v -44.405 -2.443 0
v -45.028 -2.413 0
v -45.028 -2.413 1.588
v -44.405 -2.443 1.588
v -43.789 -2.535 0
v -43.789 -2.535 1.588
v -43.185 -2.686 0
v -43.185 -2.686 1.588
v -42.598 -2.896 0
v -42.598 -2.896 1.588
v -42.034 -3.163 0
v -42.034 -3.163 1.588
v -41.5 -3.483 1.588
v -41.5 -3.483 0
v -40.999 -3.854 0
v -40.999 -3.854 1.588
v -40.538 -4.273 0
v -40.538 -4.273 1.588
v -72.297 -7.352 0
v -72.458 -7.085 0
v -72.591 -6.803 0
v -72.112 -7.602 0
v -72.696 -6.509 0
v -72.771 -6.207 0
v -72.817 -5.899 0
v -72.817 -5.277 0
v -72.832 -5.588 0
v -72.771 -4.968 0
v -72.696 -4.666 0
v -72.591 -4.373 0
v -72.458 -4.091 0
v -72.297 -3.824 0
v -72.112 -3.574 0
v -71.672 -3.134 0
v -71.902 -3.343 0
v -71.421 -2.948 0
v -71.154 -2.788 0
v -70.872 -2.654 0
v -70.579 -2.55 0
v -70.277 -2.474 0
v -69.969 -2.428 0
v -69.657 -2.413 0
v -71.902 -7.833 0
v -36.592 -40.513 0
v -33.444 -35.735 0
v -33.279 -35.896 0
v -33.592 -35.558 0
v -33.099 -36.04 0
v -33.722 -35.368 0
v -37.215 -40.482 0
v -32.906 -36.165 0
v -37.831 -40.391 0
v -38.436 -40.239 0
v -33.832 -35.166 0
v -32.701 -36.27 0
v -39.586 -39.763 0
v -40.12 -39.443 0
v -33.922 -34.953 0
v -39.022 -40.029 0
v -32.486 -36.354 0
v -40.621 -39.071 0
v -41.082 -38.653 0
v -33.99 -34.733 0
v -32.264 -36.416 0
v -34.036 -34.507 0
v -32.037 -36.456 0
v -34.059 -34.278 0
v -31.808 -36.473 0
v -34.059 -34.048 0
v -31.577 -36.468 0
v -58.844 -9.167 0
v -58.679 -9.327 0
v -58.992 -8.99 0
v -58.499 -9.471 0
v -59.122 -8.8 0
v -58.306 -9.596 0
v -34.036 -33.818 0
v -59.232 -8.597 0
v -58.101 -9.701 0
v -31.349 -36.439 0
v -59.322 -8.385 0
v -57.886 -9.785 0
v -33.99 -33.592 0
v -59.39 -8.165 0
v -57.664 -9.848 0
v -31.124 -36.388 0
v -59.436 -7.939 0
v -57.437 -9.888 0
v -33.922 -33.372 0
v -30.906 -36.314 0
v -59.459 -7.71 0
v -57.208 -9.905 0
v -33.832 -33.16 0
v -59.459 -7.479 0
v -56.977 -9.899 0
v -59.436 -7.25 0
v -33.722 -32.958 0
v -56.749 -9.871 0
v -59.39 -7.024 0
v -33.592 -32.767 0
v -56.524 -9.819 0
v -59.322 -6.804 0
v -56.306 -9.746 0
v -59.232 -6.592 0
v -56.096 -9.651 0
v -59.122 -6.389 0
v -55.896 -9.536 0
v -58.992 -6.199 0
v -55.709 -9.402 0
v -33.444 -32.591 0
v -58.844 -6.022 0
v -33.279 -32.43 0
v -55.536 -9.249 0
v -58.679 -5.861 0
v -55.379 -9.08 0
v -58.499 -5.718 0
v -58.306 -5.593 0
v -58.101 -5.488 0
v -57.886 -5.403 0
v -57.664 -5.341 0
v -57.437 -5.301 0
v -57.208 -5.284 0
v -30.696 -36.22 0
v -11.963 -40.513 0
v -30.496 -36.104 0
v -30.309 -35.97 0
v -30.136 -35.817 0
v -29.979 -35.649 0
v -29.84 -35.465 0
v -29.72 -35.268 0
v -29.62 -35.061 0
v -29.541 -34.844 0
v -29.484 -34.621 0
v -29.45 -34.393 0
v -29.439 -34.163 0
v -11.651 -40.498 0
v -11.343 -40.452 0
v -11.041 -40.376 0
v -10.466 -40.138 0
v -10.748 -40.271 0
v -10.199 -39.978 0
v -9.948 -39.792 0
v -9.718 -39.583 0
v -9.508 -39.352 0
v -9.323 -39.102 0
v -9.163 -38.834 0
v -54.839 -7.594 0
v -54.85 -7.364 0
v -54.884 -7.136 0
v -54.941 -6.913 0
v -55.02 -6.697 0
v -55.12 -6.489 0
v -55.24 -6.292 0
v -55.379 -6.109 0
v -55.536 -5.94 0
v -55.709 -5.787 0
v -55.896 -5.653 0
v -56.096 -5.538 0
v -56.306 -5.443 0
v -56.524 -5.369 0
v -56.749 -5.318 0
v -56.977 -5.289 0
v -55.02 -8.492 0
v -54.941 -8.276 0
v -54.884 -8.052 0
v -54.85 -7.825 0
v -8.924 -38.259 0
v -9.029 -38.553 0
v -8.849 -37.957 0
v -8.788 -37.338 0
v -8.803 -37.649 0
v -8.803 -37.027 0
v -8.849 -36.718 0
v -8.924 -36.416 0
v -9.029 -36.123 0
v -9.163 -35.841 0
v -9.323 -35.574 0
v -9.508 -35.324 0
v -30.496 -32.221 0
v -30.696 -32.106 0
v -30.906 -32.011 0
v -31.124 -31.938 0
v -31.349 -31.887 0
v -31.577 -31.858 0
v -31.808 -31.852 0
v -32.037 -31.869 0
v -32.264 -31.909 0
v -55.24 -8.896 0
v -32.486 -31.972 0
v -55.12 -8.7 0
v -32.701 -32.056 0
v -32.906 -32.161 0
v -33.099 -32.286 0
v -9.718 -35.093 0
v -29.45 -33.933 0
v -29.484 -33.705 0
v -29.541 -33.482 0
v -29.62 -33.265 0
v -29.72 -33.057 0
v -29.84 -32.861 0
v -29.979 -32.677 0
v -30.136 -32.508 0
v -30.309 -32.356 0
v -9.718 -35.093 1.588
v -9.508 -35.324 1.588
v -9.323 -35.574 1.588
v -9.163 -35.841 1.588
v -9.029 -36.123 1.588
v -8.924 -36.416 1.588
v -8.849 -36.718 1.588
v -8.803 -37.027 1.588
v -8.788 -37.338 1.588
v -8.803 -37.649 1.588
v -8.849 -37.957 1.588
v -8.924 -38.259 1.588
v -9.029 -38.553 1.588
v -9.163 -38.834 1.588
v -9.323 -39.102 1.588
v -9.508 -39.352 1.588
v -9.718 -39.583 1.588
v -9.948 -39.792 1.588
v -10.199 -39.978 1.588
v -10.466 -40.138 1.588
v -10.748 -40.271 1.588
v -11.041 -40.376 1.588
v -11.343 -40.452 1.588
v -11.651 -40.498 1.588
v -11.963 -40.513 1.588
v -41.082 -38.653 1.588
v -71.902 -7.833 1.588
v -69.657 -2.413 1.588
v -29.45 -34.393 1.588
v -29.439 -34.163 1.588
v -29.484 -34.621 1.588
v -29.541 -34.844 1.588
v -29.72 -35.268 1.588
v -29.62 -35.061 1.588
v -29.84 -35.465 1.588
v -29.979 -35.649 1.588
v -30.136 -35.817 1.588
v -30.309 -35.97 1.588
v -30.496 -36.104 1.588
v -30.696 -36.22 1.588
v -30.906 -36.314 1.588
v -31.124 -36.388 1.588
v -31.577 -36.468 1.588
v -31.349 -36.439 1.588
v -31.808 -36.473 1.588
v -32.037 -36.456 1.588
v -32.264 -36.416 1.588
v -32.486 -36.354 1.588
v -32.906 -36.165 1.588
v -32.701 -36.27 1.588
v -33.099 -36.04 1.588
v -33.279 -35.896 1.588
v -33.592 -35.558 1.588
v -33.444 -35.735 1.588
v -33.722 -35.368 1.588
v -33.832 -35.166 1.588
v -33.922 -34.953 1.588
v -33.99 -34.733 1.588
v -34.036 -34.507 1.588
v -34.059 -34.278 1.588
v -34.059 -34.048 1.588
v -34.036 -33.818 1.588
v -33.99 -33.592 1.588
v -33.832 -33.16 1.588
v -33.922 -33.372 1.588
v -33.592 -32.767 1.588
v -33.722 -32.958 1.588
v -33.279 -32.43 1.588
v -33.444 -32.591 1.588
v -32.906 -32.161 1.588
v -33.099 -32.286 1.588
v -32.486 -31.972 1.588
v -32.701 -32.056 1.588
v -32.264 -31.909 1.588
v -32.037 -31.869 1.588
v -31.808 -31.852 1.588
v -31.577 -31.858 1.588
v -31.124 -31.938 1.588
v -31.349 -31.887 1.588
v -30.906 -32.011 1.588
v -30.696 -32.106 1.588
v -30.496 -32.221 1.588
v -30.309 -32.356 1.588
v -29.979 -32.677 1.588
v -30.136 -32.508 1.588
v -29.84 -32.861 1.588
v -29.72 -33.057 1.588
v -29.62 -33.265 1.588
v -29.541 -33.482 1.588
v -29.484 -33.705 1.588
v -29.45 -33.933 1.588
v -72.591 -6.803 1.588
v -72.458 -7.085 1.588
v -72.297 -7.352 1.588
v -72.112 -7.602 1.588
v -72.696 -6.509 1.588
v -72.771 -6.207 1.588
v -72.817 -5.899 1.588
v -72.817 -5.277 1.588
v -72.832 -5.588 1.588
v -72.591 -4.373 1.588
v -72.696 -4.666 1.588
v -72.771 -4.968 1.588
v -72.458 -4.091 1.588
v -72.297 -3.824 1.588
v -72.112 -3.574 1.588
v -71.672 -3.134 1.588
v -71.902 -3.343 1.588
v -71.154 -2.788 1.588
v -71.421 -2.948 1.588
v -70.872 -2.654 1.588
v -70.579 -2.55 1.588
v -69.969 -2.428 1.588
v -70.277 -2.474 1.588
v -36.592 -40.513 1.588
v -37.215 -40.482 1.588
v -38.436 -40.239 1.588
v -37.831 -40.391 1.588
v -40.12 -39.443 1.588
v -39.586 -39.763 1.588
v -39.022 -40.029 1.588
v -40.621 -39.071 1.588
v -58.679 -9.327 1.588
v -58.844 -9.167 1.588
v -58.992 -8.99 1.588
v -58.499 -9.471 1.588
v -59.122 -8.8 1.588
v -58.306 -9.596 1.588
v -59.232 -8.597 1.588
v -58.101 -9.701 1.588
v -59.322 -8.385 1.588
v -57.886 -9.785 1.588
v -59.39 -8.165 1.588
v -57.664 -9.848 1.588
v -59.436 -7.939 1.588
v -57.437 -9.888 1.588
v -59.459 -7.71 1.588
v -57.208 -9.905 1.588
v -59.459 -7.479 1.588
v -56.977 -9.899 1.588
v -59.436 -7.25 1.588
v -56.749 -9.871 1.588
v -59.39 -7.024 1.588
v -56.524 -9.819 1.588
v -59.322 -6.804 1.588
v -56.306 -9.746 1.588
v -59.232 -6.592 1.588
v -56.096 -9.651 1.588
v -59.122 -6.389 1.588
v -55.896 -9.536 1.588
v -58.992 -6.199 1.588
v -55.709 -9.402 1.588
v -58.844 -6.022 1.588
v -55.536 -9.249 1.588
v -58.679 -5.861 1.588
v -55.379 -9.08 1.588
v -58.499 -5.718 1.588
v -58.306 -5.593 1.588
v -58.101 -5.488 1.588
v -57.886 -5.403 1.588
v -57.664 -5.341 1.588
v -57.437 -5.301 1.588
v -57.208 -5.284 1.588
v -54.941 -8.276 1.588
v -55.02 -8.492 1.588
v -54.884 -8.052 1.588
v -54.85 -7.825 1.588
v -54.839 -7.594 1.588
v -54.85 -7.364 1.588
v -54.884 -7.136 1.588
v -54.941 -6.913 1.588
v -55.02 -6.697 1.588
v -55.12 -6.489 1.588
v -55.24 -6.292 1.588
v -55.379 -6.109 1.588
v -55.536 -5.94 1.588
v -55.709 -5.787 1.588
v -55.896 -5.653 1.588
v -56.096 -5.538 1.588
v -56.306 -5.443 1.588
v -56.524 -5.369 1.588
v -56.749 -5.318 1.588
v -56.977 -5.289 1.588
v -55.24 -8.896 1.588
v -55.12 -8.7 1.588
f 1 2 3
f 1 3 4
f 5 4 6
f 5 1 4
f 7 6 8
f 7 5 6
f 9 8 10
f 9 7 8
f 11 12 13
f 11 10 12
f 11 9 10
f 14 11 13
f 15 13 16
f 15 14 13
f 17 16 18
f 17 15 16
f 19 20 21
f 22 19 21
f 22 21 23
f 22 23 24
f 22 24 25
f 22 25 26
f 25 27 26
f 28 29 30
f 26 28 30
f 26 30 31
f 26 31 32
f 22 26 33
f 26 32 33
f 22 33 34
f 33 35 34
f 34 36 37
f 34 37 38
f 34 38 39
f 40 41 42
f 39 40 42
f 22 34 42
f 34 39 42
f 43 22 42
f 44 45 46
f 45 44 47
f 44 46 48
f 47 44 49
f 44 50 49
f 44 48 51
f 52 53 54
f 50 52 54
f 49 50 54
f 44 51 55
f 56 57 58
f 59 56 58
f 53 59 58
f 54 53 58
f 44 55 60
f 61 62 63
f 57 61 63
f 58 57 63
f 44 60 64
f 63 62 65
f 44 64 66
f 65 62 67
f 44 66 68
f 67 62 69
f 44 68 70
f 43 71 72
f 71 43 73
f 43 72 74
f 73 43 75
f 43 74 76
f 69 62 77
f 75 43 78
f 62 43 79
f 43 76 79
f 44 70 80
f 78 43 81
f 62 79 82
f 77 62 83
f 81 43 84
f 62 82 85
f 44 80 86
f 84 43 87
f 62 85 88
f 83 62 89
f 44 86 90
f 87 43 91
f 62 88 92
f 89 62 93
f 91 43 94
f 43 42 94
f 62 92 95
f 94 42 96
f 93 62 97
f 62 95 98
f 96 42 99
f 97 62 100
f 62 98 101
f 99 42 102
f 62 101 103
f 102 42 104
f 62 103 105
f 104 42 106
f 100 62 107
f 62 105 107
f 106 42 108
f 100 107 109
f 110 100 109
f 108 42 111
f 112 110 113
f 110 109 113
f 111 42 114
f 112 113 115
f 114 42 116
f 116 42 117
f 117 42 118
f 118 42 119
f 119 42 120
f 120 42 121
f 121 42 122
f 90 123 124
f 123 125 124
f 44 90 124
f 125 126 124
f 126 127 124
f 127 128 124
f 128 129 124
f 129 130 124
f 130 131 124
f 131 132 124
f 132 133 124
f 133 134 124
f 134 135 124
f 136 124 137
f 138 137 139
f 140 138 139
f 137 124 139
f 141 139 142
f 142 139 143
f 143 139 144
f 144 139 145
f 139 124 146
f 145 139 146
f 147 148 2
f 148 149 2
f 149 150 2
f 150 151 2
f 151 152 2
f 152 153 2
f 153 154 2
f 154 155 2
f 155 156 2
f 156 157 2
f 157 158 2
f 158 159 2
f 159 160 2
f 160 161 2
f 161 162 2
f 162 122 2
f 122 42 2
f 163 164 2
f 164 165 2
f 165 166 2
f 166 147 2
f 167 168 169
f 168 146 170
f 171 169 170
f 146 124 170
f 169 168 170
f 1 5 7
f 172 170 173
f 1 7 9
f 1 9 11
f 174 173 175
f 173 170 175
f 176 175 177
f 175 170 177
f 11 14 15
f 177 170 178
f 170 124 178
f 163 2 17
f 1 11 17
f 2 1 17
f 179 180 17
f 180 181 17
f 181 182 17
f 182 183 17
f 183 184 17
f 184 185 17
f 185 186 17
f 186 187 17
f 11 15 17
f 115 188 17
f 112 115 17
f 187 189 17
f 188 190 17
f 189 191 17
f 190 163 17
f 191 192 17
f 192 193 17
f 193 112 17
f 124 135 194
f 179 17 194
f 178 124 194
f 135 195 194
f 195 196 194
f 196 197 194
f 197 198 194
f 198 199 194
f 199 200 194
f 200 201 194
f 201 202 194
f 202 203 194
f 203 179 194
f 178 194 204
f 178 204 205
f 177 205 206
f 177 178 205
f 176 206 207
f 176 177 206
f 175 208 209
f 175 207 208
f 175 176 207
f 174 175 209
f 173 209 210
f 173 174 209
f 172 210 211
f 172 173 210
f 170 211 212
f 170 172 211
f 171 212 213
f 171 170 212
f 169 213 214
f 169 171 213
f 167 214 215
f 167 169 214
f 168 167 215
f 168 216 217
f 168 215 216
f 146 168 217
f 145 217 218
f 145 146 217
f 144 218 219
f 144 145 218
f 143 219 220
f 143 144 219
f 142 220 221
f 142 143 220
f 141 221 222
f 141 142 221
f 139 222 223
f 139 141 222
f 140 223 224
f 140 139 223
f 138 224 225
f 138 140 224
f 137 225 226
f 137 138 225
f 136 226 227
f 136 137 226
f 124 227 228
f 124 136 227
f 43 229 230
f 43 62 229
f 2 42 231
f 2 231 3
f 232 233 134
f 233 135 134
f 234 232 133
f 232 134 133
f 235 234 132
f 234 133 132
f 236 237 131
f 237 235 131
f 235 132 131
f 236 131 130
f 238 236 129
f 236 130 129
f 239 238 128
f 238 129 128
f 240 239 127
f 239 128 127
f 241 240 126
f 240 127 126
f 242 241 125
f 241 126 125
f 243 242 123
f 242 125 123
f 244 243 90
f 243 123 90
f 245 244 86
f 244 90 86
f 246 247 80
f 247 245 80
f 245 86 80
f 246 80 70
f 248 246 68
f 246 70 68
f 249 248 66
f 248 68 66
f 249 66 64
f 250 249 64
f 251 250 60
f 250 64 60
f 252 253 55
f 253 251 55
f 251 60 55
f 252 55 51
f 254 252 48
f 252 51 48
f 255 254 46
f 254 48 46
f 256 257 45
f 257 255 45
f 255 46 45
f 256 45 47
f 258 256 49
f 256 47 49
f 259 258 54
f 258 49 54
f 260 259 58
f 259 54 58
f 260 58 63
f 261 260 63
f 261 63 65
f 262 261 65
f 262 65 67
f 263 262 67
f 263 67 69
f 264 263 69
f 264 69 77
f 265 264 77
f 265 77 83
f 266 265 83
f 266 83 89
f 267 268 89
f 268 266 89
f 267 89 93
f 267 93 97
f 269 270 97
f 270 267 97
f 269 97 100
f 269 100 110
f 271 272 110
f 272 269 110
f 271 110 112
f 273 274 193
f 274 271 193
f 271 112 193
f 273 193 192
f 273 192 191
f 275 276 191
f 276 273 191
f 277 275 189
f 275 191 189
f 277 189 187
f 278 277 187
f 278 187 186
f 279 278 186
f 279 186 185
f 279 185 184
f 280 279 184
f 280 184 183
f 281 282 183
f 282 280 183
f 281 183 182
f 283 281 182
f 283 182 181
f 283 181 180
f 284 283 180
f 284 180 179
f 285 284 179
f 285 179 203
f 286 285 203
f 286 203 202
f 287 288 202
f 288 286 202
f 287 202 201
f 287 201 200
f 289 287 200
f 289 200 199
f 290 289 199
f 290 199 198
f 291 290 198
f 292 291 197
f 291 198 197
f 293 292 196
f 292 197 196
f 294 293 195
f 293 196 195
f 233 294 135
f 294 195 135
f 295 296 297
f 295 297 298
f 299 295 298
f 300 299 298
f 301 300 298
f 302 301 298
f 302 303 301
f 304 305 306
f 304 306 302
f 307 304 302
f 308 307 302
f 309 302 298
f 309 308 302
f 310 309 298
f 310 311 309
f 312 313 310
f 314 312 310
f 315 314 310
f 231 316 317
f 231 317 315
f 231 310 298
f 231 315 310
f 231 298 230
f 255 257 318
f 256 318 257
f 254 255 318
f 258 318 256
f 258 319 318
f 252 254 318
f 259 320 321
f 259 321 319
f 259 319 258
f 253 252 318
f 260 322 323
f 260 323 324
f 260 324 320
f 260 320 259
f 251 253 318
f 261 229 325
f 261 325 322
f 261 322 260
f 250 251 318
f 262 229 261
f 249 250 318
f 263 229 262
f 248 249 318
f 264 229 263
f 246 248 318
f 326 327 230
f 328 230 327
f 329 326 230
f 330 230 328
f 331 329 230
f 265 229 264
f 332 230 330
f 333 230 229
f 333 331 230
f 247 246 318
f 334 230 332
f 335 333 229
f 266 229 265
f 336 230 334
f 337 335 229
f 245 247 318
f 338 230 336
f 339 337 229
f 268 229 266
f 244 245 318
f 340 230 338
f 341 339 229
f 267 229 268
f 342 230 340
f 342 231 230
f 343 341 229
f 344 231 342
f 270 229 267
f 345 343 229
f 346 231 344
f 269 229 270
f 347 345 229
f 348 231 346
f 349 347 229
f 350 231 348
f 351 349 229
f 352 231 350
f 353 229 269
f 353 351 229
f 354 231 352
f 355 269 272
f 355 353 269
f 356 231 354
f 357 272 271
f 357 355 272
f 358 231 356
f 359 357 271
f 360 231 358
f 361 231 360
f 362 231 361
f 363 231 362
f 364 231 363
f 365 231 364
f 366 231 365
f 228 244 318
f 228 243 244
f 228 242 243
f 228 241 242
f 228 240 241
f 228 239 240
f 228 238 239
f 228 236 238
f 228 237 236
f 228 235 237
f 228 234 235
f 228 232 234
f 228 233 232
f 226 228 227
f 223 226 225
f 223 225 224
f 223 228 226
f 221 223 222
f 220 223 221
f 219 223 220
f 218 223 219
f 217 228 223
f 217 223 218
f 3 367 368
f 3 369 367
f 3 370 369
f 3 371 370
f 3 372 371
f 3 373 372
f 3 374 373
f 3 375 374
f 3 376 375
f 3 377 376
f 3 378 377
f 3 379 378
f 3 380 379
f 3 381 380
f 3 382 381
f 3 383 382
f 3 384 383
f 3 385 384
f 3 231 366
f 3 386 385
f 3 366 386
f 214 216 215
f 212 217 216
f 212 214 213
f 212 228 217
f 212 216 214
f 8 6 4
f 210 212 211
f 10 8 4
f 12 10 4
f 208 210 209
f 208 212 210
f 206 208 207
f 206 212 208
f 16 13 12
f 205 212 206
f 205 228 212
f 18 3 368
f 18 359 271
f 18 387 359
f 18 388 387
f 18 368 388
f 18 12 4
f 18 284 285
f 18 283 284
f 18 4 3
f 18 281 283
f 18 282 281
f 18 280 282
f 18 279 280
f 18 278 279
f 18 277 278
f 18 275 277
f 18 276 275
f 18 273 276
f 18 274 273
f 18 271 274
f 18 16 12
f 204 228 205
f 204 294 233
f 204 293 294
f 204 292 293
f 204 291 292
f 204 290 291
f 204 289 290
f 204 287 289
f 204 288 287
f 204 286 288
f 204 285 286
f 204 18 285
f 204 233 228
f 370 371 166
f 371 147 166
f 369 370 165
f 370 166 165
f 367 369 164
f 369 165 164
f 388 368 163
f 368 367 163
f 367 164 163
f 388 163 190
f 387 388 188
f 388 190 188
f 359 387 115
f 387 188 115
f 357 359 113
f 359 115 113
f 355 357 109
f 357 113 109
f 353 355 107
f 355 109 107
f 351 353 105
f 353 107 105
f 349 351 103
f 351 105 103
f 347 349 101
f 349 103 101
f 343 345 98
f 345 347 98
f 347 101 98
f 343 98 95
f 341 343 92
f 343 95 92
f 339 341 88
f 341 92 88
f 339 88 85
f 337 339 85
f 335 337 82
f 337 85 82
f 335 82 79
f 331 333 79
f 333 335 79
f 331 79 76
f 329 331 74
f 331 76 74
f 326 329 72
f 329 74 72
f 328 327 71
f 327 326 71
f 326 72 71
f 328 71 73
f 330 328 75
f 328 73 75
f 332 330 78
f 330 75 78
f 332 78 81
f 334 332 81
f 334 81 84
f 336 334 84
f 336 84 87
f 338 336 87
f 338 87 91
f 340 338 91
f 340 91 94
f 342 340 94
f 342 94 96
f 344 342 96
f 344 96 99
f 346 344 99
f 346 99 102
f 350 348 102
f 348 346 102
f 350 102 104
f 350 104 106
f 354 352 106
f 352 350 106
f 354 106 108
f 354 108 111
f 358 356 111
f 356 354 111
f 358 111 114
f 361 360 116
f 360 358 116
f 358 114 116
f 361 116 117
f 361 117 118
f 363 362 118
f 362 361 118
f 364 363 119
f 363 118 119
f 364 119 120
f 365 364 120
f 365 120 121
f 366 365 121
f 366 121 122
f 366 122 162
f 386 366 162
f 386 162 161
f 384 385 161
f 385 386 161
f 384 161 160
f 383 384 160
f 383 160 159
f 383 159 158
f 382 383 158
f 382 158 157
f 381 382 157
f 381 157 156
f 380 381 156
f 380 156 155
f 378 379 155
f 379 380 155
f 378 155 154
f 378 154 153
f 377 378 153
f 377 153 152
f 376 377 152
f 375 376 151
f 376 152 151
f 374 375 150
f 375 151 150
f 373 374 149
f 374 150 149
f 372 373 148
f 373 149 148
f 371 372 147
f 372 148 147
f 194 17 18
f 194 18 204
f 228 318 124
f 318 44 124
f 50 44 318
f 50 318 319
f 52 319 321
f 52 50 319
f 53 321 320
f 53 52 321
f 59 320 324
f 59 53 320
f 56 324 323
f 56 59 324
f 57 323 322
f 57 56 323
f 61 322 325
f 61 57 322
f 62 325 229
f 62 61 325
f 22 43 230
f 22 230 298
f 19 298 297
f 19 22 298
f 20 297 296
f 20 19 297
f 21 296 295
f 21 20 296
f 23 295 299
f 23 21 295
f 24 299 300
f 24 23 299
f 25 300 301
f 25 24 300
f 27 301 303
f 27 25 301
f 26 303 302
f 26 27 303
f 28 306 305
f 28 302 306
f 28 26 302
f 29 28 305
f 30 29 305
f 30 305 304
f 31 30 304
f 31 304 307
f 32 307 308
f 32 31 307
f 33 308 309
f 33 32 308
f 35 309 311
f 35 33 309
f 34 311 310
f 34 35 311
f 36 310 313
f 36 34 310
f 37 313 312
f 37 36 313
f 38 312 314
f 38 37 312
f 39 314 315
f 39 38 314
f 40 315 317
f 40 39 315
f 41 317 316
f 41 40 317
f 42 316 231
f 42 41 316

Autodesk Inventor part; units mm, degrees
ref_plane "YZ Plane" through (0, 0, 0) normal (1, 0, 0) x (0, 1, 0)
ref_plane "XZ Plane" through (0, 0, 0) normal (0, 1, 0) x (-1, 0, 0)
ref_plane "XY Plane" through (0, 0, 0) normal (0, 0, 1) x (1, 0, 0)
sketch "Sketch2" plane through (0, 0, 0) normal (0, 0, 1) x (1, 0, 0)
  circle A0 centre (-57.15, -7.5944) radius 2.3114 projected
  circle A1 centre (-44.45, -7.5944) radius 2.3114 projected
  circle A2 centre (-31.75, -34.1628) radius 2.3114 projected
  circle A3 centre (0.0154, -27.8287) radius 41.275 construction
  line L0 (-52.827, -2.4128) -> (-63.5, -2.4128) projected
  line L1 (-41.0824, -38.6529) -> (-71.9025, -7.8329)
  circle A4 centre (-63.5, -15.1128) radius 0.7938 construction
  circle A5 centre (-38.1, -40.5128) radius 0.7937 construction
  line L2 (-36.5923, -40.5128) -> (-11.9627, -40.5128)
  line L3 (-69.6574, -2.4128) -> (-45.0278, -2.4128)
  line L4 (-40.5377, -4.2727) -> (-9.7176, -35.0927)
  arc A6 (-69.6574, -2.4128) -> (-71.9025, -7.8329) centre (-69.6574, -5.5878) ccw
  arc A7 (-11.9627, -40.5128) -> (-9.7176, -35.0927) centre (-11.9627, -37.3378) ccw
  arc A8 (-40.5377, -4.2727) -> (-45.0278, -2.4128) centre (-45.0278, -8.7628) ccw
  arc A9 (-41.0824, -38.6529) -> (-36.5923, -40.5128) centre (-36.5923, -34.1628) ccw
  point P0 (-39.2225, -40.5128)
  point P1 (-77.3225, -2.4128)
  point P2 (-4.2975, -40.5128)
  point P3 (-42.3975, -2.4128)
  dimension "d19" = 1.5875
  dimension "d20" = 1.5875
  dimension "d21" = 34.925
  dimension "d22" = 34.925
  dimension "d23" = 3.175
  dimension "d24" = 6.35
  dimension "d25" = 6.35
  dimension "d28" = 82.55
  dimension "d29" = 38.1
  dimension "d30" = 25.4159
  dimension "d31" = 0
  dimension "d32" = 0
  dimension "d33" = 12.0187
  dimension "d34" = 7.3747
  dimension "d35" = 14.9217
extrude "Extrusion2" add sketch "Sketch2" along normal blind 1.5875 contours A1 | L3 A8 L4 A7 L2 A9 L1 A6 L0
sketch "Sketch3" plane through (0, 0, 1.5875) normal (0, 0, 1) x (1, 0, 0)
  line L0 (-71.9025, -7.8329) -> (-41.0824, -38.6529)
  arc A0 (-41.0824, -38.6529) -> (-36.5923, -40.5128) centre (-36.5923, -34.1628) ccw
  line L1 (-36.5923, -40.5128) -> (-11.9627, -40.5128)
  arc A1 (-11.9627, -40.5128) -> (-9.7176, -35.0927) centre (-11.9627, -37.3378) ccw
  line L2 (-9.7176, -35.0927) -> (-40.5377, -4.2727)
  arc A2 (-40.5377, -4.2727) -> (-45.0278, -2.4128) centre (-45.0278, -8.7628) ccw
  line L3 (-45.0278, -2.4128) -> (-69.6574, -2.4128)
  arc A3 (-69.6574, -2.4128) -> (-71.9025, -7.8329) centre (-69.6574, -5.5878) ccw
  circle A4 centre (-31.75, -34.1628) radius 2.3114
  circle A5 centre (-57.15, -7.5944) radius 2.3114
  point P0 (0, 0)
equation "\"BendRadius\" = Thickness"
equation "\"BendReliefWidth\" = Thickness"
equation "\"BendReliefDepth\" = 0.5 * Thickness"
equation "\"CornerReliefSize\" = 4 * Thickness"
equation "\"MinimumRemnant\" = 2 * Thickness"
equation "\"TransitionRadius\" = BendRadius"
equation "\"JacobiRadiusSize\" = BendRadius"
equation "\"GapSize\" = Thickness"
equation "\"Thickness\" = 1.5875"
properties part number "chrissled" material "Polycarbonate, Clear"
